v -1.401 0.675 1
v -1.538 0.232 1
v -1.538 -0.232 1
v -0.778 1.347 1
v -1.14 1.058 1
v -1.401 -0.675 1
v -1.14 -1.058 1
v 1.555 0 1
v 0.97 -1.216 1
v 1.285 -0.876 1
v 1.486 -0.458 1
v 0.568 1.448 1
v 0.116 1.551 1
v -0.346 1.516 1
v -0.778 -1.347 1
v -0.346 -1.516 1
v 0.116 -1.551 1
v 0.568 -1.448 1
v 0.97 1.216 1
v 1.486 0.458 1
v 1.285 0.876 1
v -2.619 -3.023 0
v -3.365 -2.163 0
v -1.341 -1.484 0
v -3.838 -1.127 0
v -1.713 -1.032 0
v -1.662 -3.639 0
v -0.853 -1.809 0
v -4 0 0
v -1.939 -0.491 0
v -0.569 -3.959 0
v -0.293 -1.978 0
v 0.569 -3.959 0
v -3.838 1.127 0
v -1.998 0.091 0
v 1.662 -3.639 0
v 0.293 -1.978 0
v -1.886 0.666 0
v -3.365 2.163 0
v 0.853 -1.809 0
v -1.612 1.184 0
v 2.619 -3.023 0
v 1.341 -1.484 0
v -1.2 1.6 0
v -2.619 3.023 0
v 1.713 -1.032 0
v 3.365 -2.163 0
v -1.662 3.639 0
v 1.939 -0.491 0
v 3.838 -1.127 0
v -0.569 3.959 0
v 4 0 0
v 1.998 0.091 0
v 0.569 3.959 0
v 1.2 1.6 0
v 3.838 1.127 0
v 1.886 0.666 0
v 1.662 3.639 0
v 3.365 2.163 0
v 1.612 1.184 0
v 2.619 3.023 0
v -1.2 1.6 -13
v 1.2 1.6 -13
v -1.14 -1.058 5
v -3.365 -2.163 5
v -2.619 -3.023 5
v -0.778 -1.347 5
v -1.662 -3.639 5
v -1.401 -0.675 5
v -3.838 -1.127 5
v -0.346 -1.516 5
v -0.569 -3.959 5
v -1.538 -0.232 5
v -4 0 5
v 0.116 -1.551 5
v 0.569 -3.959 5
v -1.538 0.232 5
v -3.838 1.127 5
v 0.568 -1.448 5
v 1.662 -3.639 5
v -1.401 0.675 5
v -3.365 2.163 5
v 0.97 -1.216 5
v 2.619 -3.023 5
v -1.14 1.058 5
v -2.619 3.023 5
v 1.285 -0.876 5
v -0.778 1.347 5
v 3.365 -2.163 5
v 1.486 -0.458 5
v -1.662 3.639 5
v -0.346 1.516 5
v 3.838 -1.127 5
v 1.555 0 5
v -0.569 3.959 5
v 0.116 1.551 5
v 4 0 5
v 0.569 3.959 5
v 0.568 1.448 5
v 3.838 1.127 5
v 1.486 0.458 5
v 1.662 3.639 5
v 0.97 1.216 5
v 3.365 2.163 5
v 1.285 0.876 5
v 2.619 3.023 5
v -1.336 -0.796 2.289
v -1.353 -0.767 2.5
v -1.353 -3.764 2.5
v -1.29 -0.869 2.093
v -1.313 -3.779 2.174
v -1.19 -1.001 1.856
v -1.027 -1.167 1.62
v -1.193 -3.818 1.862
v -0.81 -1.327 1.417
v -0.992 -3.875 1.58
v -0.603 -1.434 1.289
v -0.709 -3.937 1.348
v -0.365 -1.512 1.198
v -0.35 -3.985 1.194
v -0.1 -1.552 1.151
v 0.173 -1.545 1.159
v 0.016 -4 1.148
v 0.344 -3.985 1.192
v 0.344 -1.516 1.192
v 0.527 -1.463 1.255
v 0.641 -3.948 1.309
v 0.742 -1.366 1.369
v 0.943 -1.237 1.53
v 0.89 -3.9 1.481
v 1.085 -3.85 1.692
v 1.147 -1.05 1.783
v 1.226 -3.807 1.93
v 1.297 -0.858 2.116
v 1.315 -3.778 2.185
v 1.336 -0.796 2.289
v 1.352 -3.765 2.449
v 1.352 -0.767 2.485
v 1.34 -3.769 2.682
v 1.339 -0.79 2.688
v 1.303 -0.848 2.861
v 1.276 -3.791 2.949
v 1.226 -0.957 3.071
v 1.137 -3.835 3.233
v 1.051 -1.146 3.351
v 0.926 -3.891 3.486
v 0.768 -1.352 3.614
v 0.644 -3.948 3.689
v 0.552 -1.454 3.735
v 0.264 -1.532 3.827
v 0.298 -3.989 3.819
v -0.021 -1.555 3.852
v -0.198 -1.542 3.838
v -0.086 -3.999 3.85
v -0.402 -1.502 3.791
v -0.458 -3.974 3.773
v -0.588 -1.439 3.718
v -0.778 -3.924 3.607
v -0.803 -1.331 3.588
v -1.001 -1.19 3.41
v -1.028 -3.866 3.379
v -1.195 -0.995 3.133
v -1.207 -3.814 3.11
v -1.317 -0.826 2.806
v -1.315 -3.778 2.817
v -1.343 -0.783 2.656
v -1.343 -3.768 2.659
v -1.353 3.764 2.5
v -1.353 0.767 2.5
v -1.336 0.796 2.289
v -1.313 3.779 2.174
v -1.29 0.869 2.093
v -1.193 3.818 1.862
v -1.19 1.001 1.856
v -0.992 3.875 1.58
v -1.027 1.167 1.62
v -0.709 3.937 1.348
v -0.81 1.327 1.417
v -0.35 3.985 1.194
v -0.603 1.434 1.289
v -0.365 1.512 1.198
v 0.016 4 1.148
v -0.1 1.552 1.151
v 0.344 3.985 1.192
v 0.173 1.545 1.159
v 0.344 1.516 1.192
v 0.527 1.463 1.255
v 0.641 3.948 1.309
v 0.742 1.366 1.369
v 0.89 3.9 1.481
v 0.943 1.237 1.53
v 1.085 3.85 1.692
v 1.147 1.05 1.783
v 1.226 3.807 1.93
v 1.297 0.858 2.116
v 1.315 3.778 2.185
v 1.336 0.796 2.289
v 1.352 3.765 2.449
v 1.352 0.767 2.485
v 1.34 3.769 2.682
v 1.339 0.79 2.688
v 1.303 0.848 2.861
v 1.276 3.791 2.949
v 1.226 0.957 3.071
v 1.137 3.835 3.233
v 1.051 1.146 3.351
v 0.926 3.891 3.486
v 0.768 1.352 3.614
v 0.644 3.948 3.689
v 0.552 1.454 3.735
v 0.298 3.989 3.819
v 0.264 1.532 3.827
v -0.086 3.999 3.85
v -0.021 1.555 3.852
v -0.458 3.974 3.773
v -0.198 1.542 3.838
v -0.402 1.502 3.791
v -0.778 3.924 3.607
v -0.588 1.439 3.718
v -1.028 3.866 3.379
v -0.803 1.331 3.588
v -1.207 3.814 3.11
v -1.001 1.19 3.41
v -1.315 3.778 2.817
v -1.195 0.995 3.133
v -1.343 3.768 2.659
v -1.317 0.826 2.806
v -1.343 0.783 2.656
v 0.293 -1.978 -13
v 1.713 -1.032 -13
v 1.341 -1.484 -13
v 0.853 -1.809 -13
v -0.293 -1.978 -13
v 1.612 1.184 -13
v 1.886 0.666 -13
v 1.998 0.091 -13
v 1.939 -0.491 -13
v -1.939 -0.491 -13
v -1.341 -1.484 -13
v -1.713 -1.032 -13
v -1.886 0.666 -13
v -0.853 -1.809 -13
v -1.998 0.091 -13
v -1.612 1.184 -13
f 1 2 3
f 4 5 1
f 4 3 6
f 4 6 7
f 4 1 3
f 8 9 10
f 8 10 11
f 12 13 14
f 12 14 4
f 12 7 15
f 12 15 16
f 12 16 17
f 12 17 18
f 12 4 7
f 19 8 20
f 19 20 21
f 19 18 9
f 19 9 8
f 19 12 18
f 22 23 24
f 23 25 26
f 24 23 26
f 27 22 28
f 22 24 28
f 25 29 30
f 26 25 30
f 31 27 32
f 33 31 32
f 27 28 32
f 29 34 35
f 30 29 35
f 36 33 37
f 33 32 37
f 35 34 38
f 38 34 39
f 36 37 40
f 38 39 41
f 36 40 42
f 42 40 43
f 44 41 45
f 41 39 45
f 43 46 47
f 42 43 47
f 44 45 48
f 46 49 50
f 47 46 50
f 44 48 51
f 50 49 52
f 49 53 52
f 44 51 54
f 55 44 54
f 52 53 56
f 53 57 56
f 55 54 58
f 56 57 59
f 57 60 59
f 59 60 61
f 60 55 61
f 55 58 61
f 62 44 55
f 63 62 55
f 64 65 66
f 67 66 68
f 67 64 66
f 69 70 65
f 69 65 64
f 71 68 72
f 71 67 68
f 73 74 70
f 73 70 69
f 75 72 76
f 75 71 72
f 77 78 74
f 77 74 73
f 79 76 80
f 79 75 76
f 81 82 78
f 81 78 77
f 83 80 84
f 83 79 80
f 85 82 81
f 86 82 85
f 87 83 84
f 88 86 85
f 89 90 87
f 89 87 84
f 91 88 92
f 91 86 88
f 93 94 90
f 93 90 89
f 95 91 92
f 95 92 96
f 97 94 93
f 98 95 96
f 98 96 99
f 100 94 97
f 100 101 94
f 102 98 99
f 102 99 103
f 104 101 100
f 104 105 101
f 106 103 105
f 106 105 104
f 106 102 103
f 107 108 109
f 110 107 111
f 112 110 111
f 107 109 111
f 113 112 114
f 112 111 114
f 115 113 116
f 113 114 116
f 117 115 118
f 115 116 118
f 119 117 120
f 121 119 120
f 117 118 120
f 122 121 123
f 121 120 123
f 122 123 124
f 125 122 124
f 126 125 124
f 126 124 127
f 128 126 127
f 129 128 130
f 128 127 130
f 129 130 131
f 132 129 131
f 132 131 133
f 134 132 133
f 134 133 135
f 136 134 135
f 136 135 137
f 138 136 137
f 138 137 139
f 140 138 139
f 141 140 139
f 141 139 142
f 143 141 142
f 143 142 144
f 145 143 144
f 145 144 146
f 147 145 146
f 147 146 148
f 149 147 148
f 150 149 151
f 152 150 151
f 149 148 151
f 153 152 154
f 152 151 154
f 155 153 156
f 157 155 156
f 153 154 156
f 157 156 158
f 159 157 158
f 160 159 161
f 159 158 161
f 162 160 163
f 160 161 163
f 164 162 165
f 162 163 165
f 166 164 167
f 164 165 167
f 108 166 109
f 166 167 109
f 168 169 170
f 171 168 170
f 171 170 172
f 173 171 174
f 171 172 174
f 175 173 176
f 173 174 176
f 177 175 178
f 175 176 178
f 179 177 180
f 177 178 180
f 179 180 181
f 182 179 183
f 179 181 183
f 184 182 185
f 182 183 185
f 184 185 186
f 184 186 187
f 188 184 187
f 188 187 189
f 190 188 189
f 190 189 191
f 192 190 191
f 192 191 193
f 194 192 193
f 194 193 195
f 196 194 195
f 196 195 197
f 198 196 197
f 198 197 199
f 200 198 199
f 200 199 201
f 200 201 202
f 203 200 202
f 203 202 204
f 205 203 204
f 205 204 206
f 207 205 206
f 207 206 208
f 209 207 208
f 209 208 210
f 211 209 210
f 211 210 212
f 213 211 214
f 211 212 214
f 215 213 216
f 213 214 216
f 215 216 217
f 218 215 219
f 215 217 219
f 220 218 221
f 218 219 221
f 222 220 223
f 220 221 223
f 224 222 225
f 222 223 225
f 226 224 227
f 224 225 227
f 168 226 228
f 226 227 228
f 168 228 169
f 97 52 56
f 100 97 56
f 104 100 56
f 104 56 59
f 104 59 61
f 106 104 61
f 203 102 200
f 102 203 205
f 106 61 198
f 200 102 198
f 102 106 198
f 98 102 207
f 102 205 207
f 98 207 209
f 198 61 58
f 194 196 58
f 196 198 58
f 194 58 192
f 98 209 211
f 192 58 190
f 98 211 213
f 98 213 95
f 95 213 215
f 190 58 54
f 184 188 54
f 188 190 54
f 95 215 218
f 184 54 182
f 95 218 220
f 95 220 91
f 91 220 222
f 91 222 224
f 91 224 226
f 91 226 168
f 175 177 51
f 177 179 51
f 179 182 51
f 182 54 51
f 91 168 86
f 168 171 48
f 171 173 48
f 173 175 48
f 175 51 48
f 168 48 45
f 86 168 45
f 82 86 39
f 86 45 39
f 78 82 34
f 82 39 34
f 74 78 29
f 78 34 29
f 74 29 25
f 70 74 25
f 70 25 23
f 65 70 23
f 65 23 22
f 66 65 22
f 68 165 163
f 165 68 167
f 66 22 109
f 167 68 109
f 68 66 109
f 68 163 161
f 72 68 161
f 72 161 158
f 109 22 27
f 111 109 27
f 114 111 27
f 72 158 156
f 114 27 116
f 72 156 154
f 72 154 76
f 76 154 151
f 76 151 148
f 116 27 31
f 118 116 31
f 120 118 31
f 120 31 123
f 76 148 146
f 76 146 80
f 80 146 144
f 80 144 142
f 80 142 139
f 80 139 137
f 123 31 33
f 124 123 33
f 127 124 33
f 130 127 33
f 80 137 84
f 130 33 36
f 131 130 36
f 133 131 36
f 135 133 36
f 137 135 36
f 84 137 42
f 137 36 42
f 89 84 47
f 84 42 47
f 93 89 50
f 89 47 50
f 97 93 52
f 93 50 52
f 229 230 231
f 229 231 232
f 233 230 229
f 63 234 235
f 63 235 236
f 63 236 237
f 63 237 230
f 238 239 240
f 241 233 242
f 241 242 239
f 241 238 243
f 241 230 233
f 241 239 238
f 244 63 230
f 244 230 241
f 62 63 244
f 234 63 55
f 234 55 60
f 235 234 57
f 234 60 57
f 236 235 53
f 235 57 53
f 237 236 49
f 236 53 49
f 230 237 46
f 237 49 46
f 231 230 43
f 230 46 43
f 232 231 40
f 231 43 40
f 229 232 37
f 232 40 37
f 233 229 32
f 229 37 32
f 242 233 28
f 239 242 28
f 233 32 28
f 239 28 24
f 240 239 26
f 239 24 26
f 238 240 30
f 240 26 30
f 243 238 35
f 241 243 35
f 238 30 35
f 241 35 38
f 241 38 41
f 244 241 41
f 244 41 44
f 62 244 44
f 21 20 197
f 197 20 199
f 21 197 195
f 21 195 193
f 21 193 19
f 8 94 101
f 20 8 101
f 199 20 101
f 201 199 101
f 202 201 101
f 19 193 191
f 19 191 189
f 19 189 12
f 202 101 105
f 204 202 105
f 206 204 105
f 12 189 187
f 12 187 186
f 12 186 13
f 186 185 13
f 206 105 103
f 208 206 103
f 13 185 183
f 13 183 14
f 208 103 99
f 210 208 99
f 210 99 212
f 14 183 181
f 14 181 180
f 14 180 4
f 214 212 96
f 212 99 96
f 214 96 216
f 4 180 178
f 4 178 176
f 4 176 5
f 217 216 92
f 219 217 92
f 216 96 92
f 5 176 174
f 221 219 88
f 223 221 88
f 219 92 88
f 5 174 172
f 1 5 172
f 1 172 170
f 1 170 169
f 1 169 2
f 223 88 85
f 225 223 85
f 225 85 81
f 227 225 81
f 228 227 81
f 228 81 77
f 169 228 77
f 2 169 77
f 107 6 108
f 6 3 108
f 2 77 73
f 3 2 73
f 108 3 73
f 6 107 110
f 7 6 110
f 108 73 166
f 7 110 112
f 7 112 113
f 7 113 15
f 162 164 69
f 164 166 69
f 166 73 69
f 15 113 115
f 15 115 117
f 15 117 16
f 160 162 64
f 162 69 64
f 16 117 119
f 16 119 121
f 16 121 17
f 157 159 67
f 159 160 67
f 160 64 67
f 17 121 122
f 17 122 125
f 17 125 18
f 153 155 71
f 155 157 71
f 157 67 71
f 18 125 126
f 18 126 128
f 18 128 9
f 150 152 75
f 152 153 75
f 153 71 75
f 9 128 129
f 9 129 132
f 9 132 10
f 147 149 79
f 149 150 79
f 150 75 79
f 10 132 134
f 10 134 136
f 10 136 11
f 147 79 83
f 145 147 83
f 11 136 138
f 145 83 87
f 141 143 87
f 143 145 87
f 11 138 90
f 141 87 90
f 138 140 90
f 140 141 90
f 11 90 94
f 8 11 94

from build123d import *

# Parameters (mm, degrees)
SKETCH1_R             = 4
BOSS_EXTRUDE1_DEPTH   = 5
SKETCH2_R             = 1.555
CUT_EXTRUDE1_DEPTH    = 4
BOSS_EXTRUDE2_DEPTH   = 13
F_6_32_TAPPED_HOLE2_D = 2.7051


with BuildPart() as part:
    # Sketch1 → Boss-Extrude1 (new body)
    with BuildSketch(Plane.XY):
        Circle(SKETCH1_R)
    extrude(amount=BOSS_EXTRUDE1_DEPTH)

    # Sketch2 → Cut-Extrude1 (cut)
    with BuildSketch(Plane.XY.offset(5)):
        Circle(SKETCH2_R)
    extrude(amount=-CUT_EXTRUDE1_DEPTH, mode=Mode.SUBTRACT)

    # Sketch3 → Boss-Extrude2 (add)
    with BuildSketch(Plane(origin=(0, 0, 0), x_dir=(-1, 0, 0), z_dir=(0, 0, -1))):
        with BuildLine():
            Line((1.2, 1.6), (-1.2, 1.6))
            ThreePointArc((-1.2, 1.6), (-0.894427191, -1.788854382), (2, 0))
            ThreePointArc((2, 0), (1.788854382, 0.894427191), (1.2, 1.6))
        make_face()
    extrude(amount=BOSS_EXTRUDE2_DEPTH)

    # #6-32 Tapped Hole2 (through all)
    with Locations(Plane(origin=(0, 4, 0), x_dir=(1, 0, 0), z_dir=(0, 1, 0))):
        with Locations((0, -2.5)):
            Hole(F_6_32_TAPPED_HOLE2_D / 2)


solid = part.part
